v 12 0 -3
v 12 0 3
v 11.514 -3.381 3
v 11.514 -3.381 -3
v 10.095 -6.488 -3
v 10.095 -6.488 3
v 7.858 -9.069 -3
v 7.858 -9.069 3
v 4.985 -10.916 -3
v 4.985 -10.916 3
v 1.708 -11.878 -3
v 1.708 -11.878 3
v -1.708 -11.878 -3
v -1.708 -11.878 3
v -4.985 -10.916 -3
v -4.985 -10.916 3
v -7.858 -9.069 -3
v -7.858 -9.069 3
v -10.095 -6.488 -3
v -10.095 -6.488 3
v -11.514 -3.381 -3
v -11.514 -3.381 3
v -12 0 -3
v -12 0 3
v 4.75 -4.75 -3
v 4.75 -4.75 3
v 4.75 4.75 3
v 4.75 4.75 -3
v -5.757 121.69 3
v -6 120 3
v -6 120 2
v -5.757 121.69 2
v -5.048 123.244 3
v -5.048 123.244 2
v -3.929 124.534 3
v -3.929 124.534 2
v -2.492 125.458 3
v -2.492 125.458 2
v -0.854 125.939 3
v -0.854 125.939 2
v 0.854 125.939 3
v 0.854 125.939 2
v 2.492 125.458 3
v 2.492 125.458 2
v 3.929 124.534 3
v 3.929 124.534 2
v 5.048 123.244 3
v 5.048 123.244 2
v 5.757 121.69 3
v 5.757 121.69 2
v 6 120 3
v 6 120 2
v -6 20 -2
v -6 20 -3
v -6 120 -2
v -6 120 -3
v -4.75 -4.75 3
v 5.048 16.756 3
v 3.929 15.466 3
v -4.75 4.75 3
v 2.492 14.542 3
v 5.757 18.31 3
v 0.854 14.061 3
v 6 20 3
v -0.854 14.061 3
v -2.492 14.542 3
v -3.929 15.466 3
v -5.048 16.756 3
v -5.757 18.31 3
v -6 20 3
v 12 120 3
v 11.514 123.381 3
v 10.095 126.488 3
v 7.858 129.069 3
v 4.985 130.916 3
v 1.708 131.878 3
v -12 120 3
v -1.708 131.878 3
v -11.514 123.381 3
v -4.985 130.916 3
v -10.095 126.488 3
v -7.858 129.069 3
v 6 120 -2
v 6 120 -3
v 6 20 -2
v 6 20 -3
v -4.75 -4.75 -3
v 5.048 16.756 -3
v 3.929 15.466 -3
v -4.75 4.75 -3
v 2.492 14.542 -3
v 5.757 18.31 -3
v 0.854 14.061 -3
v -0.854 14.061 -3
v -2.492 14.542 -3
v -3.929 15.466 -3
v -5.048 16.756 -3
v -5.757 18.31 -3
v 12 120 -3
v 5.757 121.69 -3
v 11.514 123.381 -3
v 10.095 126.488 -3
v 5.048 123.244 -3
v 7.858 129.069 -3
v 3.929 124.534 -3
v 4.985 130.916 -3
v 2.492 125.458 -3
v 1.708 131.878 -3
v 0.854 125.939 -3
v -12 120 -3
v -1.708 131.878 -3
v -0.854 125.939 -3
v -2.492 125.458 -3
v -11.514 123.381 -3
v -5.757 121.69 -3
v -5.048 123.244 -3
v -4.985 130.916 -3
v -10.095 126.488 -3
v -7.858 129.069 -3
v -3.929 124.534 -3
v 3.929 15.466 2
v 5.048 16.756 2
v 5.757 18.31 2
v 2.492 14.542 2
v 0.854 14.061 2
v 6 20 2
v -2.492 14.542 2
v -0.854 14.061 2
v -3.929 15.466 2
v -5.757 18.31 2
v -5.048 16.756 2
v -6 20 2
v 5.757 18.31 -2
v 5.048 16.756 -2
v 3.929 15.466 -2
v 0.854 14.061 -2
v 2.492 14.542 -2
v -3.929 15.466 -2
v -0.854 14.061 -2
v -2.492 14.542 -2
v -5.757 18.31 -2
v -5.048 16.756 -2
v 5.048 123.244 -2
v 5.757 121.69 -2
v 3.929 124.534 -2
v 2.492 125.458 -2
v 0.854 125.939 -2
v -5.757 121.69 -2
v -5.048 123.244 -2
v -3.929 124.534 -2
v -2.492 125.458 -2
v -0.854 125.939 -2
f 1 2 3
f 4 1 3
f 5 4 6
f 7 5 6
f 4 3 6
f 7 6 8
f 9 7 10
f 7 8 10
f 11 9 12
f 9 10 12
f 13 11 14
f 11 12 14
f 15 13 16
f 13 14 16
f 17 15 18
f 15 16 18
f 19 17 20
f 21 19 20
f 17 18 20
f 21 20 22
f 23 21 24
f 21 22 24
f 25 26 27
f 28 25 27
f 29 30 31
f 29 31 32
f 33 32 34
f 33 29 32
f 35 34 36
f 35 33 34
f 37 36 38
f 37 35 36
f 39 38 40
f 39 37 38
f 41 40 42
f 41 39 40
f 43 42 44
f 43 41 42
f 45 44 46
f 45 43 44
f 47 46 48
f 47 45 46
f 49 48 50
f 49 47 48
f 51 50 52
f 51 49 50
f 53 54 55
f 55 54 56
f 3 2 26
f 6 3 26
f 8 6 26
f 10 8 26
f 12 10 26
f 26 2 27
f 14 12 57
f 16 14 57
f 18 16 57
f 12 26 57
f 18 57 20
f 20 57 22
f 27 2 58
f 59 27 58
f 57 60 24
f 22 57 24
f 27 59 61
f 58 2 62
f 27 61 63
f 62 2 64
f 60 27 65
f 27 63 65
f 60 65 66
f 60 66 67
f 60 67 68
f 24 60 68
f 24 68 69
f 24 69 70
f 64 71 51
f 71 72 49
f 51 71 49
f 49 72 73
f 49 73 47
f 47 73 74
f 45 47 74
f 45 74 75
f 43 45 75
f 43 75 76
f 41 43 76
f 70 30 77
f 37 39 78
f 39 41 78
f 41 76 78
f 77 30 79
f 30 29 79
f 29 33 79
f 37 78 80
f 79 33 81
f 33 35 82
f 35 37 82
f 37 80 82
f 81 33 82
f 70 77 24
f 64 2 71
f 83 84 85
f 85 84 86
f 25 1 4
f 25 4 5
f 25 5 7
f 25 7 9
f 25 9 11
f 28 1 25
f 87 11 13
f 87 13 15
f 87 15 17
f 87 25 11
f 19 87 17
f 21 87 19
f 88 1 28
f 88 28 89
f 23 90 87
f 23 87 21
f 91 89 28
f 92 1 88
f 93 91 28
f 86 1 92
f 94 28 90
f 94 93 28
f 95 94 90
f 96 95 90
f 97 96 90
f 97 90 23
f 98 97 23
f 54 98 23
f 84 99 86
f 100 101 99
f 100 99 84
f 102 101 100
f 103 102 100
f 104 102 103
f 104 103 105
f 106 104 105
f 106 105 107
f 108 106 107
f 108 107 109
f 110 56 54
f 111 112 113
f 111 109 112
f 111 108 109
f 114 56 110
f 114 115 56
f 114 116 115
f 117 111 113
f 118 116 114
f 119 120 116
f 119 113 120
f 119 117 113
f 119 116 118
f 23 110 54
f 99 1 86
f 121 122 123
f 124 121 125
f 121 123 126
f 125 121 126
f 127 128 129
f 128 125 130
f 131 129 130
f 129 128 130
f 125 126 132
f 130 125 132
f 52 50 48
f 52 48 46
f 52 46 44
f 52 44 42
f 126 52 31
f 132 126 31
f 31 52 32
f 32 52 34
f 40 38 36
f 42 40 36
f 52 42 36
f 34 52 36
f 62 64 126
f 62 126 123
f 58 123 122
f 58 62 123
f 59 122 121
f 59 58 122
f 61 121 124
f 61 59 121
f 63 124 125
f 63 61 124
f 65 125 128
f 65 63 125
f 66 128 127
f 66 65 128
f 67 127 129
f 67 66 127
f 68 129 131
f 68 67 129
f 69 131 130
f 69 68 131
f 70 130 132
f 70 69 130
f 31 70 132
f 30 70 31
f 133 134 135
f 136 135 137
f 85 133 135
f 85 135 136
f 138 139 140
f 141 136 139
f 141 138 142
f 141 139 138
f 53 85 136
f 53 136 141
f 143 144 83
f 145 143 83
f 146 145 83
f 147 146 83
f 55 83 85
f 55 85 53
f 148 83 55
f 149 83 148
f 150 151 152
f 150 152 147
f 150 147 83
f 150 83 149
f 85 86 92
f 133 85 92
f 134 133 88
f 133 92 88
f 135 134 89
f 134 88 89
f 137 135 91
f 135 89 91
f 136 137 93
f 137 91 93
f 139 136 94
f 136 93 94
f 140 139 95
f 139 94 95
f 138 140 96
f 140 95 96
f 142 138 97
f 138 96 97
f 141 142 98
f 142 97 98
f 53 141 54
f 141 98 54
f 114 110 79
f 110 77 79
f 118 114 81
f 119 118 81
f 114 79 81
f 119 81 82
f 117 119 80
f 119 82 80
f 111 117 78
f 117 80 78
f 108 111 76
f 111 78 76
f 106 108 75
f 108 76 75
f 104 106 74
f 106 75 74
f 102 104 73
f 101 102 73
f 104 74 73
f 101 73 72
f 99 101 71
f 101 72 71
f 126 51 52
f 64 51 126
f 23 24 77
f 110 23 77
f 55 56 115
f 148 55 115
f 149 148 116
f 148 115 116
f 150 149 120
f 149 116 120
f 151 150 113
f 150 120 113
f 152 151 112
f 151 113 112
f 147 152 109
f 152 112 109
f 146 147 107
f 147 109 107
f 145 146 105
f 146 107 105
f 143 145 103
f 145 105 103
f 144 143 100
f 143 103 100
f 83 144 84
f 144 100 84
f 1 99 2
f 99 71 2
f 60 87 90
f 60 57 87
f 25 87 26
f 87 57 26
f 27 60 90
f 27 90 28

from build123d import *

# Parameters (mm, degrees)
SKETCH_1_W          = 9.5
SKETCH_1_H          = 9.5
EXTRUDE_1_DEPTH     = 3
CUT_EXTRUDE_1_DEPTH = 1


with BuildPart() as part:
    # 草图1 → 凸台-拉伸1 (new body, symmetric)
    with BuildSketch(Plane.XY):
        with BuildLine():
            Line((-12, 0), (-12, 120))
            ThreePointArc((-12, 120), (0, 132), (12, 120))
            Line((12, 120), (12, 0))
            ThreePointArc((12, 0), (0, -12), (-12, 0))
        make_face()
        Rectangle(SKETCH_1_W, SKETCH_1_H, mode=Mode.SUBTRACT)
    extrude(amount=EXTRUDE_1_DEPTH, both=True)

    # 草图2 → 切除-拉伸1 (cut)
    with BuildSketch(Plane.XY.offset(3)):
        with BuildLine():
            Line((-6, 20), (-6, 120))
            ThreePointArc((-6, 120), (0, 126), (6, 120))
            Line((6, 120), (6, 20))
            ThreePointArc((6, 20), (0, 14), (-6, 20))
        make_face()
    cut_extrude_1 = extrude(amount=-CUT_EXTRUDE_1_DEPTH, mode=Mode.SUBTRACT)

    # 镜向1: 切除-拉伸1 across plane
    add(cut_extrude_1.mirror(Plane.XY), mode=Mode.SUBTRACT)


solid = part.part
